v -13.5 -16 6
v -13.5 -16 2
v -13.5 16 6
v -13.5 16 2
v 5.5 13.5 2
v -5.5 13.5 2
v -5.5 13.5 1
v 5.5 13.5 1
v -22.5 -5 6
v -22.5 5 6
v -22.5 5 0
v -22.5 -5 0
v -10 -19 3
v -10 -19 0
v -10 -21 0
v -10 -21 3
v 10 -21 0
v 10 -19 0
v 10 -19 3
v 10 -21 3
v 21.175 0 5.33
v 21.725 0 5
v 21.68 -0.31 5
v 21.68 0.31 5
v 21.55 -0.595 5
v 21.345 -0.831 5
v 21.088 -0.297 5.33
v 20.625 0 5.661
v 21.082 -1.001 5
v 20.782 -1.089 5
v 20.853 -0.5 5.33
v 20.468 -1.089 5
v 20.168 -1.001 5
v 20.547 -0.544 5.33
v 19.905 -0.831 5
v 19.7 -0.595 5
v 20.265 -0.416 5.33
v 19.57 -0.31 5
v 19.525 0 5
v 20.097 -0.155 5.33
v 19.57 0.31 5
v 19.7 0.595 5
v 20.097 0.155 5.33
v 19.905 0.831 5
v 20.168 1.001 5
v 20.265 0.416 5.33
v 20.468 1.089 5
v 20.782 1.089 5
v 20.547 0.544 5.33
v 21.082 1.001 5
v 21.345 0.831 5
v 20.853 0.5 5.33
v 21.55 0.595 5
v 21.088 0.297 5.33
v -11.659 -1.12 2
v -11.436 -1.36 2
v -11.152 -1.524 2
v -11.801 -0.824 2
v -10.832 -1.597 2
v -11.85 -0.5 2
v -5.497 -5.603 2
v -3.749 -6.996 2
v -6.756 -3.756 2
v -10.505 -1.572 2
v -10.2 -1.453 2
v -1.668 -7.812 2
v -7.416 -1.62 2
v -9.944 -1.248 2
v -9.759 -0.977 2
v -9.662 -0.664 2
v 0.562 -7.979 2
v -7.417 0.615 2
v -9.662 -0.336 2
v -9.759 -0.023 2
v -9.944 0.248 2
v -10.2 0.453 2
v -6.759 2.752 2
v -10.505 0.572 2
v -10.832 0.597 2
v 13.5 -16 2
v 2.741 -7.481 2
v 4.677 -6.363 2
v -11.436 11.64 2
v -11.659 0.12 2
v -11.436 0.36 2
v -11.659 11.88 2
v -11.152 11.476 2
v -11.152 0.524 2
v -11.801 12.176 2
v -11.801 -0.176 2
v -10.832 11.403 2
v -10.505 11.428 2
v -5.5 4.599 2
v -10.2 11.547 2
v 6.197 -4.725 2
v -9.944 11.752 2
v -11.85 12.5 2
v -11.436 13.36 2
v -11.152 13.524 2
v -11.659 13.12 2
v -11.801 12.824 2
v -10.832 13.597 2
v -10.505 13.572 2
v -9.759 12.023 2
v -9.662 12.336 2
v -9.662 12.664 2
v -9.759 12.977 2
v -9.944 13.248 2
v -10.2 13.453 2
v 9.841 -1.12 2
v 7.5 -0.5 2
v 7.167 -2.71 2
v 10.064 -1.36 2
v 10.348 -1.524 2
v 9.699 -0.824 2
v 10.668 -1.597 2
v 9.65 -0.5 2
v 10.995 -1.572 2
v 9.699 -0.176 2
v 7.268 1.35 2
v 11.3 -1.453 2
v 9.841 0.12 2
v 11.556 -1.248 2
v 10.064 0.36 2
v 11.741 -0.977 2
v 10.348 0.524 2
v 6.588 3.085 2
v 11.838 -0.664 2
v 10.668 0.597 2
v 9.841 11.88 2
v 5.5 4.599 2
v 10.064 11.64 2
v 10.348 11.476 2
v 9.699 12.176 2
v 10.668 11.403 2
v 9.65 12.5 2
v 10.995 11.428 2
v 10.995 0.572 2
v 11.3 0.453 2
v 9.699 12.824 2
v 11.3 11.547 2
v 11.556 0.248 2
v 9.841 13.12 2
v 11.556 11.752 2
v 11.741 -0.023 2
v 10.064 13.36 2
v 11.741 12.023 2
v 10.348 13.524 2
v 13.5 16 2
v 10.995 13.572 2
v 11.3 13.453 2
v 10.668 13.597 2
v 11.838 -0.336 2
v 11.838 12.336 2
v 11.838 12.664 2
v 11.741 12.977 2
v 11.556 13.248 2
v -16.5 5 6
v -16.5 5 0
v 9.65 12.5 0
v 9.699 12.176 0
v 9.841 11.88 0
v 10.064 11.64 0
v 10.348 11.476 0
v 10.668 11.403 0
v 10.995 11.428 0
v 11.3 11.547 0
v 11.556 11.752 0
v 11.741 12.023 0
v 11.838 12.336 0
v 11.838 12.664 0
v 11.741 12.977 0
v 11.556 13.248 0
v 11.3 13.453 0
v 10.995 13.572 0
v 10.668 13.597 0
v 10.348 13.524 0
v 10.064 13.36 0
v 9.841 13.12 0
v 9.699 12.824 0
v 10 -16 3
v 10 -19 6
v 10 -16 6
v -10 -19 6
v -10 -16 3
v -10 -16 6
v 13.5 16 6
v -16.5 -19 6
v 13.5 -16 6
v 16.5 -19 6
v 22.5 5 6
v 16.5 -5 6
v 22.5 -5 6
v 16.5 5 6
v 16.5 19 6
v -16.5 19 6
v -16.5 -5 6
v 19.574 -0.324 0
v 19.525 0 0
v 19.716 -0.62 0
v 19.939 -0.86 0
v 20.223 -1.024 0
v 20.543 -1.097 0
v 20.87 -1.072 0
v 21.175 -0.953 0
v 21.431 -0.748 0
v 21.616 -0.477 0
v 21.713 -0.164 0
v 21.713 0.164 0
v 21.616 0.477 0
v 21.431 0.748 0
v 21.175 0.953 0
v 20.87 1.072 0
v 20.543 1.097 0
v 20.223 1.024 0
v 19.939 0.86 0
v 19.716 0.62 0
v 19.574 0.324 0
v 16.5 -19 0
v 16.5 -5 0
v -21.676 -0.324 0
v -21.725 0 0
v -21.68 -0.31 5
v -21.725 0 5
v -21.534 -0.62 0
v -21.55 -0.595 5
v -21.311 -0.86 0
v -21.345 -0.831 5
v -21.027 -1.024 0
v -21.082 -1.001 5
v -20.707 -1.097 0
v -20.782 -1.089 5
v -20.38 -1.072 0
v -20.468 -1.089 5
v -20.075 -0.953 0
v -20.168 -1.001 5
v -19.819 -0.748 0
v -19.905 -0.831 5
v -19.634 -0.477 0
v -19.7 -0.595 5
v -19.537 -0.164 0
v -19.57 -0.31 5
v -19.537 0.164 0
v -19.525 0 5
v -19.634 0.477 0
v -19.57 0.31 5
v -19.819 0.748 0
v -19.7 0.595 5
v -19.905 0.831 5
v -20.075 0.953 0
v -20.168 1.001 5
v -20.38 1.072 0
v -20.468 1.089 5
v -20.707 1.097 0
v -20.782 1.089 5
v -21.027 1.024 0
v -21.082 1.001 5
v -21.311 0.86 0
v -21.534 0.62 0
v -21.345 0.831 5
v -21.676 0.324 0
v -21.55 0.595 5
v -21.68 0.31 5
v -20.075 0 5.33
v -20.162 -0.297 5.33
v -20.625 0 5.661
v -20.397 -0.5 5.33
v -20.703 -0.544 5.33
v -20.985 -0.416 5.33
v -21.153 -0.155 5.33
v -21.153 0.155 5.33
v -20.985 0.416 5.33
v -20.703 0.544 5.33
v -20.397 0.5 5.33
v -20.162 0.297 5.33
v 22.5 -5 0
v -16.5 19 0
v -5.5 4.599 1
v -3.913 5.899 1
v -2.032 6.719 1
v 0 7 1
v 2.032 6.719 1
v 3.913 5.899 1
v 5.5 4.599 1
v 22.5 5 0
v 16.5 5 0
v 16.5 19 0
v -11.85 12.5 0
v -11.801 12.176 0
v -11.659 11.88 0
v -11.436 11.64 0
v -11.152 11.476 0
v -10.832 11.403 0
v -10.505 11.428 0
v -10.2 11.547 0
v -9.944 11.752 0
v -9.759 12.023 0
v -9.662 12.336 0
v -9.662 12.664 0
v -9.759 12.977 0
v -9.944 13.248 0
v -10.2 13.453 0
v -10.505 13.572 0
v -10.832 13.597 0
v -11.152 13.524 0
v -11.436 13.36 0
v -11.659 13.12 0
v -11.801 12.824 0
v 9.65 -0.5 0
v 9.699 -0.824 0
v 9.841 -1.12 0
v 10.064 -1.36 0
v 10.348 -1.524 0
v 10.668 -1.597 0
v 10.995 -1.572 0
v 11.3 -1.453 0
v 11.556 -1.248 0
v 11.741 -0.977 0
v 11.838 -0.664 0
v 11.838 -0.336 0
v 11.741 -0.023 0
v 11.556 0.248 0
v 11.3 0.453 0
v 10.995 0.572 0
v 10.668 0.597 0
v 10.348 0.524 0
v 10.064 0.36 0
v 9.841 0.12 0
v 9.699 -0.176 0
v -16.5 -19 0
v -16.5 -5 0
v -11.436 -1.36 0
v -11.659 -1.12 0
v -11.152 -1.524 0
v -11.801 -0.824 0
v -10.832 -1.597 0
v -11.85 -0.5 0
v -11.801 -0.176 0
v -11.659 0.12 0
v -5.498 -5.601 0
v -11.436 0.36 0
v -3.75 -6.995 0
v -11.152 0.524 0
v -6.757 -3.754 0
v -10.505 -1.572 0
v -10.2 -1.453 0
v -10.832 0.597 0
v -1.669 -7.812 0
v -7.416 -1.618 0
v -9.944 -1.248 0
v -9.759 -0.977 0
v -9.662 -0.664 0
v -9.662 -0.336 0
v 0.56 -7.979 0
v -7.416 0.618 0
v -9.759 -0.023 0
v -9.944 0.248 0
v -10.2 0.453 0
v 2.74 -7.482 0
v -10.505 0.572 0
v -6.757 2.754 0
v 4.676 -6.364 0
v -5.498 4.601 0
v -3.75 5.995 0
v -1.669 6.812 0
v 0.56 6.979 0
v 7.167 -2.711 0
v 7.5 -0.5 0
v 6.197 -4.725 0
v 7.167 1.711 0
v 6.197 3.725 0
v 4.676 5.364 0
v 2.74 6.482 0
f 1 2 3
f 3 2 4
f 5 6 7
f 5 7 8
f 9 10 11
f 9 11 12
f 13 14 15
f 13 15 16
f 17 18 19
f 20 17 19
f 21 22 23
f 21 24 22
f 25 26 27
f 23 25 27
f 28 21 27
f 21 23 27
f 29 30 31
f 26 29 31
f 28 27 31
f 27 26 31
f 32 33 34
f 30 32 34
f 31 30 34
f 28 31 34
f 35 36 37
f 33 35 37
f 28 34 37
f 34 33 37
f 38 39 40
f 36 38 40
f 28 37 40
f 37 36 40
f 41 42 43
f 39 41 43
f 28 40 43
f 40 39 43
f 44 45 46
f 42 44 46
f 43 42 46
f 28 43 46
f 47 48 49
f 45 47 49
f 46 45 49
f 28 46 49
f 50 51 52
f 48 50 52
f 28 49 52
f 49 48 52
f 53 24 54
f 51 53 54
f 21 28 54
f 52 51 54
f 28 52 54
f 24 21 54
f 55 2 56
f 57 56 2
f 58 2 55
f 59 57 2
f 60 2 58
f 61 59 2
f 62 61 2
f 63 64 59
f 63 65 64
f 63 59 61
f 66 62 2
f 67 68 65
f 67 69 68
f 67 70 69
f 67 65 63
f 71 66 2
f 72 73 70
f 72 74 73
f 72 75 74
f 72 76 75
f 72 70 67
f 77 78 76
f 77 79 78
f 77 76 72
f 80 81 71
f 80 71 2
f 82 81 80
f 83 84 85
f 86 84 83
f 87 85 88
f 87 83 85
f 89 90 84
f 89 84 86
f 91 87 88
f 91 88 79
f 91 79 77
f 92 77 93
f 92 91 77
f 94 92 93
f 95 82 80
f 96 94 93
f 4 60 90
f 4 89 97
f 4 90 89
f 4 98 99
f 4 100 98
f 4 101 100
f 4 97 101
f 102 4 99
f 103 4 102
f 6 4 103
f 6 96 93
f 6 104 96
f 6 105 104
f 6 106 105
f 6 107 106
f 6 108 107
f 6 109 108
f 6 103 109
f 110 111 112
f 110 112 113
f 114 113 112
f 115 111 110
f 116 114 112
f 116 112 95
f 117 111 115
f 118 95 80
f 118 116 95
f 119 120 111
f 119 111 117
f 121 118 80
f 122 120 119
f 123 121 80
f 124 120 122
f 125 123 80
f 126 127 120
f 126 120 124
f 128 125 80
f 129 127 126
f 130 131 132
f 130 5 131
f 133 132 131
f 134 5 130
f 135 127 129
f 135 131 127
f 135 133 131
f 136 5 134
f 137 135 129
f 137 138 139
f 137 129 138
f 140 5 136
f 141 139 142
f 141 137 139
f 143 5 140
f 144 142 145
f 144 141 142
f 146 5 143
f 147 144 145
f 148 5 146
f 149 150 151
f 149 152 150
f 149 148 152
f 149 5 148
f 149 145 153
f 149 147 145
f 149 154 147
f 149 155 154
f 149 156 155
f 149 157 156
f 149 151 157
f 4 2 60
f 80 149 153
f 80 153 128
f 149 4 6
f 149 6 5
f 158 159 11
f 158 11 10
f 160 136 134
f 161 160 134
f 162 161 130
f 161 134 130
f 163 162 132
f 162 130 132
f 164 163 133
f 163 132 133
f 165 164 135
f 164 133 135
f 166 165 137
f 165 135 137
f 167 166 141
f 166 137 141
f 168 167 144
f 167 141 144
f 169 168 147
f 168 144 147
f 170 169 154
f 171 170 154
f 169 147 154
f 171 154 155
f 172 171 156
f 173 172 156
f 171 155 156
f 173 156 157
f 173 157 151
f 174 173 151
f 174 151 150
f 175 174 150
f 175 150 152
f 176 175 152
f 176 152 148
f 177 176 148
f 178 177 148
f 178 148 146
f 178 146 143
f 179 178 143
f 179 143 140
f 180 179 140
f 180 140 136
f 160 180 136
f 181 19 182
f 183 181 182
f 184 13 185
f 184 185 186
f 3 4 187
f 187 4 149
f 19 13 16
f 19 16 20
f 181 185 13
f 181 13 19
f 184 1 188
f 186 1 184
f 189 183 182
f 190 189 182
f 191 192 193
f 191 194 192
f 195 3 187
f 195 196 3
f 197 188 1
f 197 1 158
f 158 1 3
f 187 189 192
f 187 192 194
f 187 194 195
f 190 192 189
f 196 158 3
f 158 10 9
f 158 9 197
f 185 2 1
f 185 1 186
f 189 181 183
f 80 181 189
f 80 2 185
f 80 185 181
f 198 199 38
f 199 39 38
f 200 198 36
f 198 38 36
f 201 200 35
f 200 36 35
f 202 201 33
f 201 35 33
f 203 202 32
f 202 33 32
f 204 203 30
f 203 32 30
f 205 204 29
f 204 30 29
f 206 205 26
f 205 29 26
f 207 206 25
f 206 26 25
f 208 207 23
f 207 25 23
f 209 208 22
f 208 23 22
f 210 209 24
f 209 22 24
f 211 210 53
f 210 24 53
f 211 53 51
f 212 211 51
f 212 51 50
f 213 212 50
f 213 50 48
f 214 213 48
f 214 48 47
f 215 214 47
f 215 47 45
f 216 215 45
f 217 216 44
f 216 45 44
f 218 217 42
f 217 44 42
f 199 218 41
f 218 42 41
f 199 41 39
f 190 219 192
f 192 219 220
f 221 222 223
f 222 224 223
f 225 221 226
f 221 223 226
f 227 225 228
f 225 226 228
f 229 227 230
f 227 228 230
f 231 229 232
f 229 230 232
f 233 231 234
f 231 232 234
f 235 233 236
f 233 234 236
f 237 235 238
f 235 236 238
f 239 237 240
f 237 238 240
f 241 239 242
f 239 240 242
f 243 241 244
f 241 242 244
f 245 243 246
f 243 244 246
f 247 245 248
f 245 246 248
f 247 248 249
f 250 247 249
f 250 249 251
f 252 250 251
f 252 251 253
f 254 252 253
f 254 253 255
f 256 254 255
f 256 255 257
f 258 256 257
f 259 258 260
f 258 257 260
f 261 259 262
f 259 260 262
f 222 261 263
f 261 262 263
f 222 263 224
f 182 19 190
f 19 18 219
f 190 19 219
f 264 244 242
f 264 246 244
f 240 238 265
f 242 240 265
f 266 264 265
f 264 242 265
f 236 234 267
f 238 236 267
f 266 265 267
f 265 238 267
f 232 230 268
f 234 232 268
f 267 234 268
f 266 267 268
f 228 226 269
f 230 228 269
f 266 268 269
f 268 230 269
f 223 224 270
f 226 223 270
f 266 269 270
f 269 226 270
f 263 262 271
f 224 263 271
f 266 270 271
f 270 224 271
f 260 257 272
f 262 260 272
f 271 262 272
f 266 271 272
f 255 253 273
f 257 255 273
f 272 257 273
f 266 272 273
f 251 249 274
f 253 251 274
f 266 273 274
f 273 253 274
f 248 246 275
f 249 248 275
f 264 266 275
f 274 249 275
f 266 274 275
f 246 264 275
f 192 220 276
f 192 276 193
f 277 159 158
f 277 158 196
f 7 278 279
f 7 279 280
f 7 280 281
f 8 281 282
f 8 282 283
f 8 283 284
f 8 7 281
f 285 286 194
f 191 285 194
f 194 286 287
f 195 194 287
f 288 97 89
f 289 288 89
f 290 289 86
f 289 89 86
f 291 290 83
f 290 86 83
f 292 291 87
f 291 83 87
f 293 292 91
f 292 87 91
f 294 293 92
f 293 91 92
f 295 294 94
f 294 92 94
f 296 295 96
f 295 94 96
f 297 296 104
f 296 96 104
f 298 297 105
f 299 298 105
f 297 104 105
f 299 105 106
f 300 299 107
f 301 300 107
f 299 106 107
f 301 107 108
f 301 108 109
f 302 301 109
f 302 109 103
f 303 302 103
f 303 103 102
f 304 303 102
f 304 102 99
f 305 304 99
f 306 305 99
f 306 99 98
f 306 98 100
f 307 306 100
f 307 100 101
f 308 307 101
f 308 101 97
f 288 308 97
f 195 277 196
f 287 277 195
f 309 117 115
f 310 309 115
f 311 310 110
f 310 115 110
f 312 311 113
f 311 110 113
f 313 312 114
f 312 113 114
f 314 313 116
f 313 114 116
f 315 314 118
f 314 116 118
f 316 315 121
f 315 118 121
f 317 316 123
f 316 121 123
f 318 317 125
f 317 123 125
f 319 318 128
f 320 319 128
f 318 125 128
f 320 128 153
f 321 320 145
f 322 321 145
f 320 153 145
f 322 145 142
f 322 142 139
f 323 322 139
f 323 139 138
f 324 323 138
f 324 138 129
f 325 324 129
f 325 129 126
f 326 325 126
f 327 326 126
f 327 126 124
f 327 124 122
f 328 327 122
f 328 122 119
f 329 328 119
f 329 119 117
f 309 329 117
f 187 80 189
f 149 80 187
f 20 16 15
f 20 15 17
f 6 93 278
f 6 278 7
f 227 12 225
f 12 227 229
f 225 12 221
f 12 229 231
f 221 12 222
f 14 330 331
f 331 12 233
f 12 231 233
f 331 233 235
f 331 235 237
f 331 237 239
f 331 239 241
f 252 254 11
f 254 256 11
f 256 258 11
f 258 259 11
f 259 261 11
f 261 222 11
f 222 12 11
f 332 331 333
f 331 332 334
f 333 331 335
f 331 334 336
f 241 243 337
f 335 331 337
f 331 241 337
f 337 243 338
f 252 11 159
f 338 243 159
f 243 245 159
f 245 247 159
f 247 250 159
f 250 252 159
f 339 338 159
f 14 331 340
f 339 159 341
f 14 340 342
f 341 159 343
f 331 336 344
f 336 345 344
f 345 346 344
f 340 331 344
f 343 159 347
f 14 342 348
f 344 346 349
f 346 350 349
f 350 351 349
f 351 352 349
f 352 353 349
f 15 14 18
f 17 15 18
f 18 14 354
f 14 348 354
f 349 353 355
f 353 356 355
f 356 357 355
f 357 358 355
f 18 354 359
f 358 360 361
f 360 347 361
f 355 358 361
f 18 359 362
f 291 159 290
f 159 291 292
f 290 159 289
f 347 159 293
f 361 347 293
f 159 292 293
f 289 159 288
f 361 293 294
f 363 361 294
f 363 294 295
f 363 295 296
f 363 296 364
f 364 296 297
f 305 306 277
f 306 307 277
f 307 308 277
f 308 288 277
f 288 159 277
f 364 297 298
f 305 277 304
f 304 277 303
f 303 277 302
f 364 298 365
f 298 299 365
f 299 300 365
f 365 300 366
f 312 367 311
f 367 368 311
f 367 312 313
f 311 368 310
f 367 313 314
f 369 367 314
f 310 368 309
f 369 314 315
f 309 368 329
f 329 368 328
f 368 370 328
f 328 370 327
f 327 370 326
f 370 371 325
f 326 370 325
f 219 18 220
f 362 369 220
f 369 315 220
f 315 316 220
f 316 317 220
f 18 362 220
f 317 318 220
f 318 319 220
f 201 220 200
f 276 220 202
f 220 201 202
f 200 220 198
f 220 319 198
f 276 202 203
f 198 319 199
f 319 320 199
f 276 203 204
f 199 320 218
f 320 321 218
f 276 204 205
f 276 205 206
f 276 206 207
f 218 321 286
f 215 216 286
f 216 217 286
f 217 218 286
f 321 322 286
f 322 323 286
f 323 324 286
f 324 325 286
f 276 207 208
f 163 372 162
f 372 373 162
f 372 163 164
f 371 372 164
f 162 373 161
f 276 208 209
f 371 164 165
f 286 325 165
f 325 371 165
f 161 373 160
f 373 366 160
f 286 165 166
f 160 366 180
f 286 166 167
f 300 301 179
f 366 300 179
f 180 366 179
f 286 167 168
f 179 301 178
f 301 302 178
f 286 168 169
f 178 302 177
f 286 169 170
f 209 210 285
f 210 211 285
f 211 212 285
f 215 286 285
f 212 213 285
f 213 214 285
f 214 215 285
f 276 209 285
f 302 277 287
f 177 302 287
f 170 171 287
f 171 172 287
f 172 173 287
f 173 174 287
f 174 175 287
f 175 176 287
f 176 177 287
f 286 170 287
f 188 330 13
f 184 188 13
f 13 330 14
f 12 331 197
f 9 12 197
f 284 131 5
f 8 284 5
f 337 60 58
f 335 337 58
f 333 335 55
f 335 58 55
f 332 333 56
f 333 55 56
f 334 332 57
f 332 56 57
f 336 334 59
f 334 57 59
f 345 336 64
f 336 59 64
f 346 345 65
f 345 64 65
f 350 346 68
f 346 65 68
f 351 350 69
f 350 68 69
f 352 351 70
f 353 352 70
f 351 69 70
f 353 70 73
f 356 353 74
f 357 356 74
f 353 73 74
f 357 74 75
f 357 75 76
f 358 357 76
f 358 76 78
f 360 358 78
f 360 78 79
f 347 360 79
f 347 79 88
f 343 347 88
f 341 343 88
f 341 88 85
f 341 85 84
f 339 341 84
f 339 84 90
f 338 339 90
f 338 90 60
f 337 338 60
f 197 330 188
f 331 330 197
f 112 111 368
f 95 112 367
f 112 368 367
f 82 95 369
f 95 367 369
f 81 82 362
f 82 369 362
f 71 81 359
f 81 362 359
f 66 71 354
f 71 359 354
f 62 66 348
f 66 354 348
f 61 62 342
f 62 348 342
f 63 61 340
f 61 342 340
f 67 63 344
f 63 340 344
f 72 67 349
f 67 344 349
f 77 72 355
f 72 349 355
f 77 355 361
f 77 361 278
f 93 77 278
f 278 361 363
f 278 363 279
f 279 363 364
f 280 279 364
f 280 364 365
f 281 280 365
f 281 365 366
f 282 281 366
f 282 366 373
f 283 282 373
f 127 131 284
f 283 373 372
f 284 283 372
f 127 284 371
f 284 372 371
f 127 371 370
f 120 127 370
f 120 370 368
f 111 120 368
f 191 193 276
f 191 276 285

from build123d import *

# Parameters (mm, degrees)
F0_W      = 33
F0_H      = 38
F0_W_2    = 27
F0_H_2    = 32
F1_DEPTH  = 6
F2_DEPTH  = 2
F4_D      = 2.2
F4_DEPTH  = 5
F4_TIP    = 0.6609466809
F5_W      = 10
F5_H      = 6
F6_DEPTH  = 6
F7_W      = 10
F7_H      = 6
F8_DEPTH  = 6
F10_D     = 2.2
F10_DEPTH = 5
F10_TIP   = 0.6609466809
F11_W     = 20
F11_H     = 3
F12_DEPTH = 3
F13_W     = 20
F13_H     = 3
F14_DEPTH = 2
F15_W     = 11
F15_H     = 15
F16_DEPTH = 2
F3_R      = 7.5
F17_DEPTH = 2.001


with BuildPart() as f1:
    # F0 (on Top) → F1 (new body)
    with BuildSketch(Plane.XY):
        Rectangle(F0_W, F0_H)
        Rectangle(F0_W_2, F0_H_2, mode=Mode.SUBTRACT)
    extrude(amount=F1_DEPTH)

    # F0 (on Top) → F2 (join)
    with BuildSketch(Plane.XY):
        Rectangle(F0_W_2, F0_H_2)
    extrude(amount=F2_DEPTH)

    # F4
    with Locations(Plane(origin=(0, 0, 0), x_dir=(1, 0, 0), z_dir=(0, 0, -1))):
        with Locations((-10.75, 0.5), (-10.75, -12.5), (10.75, -12.5), (10.75, 0.5)):
            Hole(F4_D / 2, depth=F4_DEPTH)
            with Locations((0, 0, -(F4_DEPTH + F4_TIP / 2))):  # 118° drill point
                Cone(0, F4_D / 2, F4_TIP, mode=Mode.SUBTRACT)

    # F5 (on face) → F6 (join)
    with BuildSketch(Plane.YZ.offset(16.5)):
        with Locations((0, 3)):
            Rectangle(F5_W, F5_H)
    extrude(amount=F6_DEPTH)

    # F7 (on face) → F8 (join)
    with BuildSketch(Plane(origin=(-16.5, 0, 0), x_dir=(0, -1, 0), z_dir=(-1, 0, 0))):
        with Locations((0, 3)):
            Rectangle(F7_W, F7_H)
    extrude(amount=F8_DEPTH)

    # F10
    with Locations(Plane(origin=(0, 0, 0), x_dir=(1, 0, 0), z_dir=(0, 0, -1))):
        with Locations((20.625, 0), (-20.625, 0)):
            Hole(F10_D / 2, depth=F10_DEPTH)
            with Locations((0, 0, -(F10_DEPTH + F10_TIP / 2))):  # 118° drill point
                Cone(0, F10_D / 2, F10_TIP, mode=Mode.SUBTRACT)

    # F11 (on face) → F12 (cut, through all)
    with BuildSketch(Plane.XZ.offset(19)):
        with Locations((0, 4.5)):
            Rectangle(F11_W, F11_H)
    extrude(amount=-F12_DEPTH, mode=Mode.SUBTRACT)

    # F13 (on face) → F14 (join)
    with BuildSketch(Plane.XZ.offset(19)):
        with Locations((0, 1.5)):
            Rectangle(F13_W, F13_H)
    extrude(amount=F14_DEPTH)

    # F15 (on face) → F16 (cut)
    with BuildSketch(Plane.XY.offset(3)):
        with Locations((0, 6)):
            Rectangle(F15_W, F15_H)
    extrude(amount=-F16_DEPTH, mode=Mode.SUBTRACT)

    # F3 (on face) → F17 (cut, through all)
    with BuildSketch(Plane(origin=(0, 0, 0), x_dir=(1, 0, 0), z_dir=(0, 0, -1))):
        with Locations((0, 0.5)):
            Circle(F3_R)
    extrude(amount=-F17_DEPTH, mode=Mode.SUBTRACT)


solid = f1.part
